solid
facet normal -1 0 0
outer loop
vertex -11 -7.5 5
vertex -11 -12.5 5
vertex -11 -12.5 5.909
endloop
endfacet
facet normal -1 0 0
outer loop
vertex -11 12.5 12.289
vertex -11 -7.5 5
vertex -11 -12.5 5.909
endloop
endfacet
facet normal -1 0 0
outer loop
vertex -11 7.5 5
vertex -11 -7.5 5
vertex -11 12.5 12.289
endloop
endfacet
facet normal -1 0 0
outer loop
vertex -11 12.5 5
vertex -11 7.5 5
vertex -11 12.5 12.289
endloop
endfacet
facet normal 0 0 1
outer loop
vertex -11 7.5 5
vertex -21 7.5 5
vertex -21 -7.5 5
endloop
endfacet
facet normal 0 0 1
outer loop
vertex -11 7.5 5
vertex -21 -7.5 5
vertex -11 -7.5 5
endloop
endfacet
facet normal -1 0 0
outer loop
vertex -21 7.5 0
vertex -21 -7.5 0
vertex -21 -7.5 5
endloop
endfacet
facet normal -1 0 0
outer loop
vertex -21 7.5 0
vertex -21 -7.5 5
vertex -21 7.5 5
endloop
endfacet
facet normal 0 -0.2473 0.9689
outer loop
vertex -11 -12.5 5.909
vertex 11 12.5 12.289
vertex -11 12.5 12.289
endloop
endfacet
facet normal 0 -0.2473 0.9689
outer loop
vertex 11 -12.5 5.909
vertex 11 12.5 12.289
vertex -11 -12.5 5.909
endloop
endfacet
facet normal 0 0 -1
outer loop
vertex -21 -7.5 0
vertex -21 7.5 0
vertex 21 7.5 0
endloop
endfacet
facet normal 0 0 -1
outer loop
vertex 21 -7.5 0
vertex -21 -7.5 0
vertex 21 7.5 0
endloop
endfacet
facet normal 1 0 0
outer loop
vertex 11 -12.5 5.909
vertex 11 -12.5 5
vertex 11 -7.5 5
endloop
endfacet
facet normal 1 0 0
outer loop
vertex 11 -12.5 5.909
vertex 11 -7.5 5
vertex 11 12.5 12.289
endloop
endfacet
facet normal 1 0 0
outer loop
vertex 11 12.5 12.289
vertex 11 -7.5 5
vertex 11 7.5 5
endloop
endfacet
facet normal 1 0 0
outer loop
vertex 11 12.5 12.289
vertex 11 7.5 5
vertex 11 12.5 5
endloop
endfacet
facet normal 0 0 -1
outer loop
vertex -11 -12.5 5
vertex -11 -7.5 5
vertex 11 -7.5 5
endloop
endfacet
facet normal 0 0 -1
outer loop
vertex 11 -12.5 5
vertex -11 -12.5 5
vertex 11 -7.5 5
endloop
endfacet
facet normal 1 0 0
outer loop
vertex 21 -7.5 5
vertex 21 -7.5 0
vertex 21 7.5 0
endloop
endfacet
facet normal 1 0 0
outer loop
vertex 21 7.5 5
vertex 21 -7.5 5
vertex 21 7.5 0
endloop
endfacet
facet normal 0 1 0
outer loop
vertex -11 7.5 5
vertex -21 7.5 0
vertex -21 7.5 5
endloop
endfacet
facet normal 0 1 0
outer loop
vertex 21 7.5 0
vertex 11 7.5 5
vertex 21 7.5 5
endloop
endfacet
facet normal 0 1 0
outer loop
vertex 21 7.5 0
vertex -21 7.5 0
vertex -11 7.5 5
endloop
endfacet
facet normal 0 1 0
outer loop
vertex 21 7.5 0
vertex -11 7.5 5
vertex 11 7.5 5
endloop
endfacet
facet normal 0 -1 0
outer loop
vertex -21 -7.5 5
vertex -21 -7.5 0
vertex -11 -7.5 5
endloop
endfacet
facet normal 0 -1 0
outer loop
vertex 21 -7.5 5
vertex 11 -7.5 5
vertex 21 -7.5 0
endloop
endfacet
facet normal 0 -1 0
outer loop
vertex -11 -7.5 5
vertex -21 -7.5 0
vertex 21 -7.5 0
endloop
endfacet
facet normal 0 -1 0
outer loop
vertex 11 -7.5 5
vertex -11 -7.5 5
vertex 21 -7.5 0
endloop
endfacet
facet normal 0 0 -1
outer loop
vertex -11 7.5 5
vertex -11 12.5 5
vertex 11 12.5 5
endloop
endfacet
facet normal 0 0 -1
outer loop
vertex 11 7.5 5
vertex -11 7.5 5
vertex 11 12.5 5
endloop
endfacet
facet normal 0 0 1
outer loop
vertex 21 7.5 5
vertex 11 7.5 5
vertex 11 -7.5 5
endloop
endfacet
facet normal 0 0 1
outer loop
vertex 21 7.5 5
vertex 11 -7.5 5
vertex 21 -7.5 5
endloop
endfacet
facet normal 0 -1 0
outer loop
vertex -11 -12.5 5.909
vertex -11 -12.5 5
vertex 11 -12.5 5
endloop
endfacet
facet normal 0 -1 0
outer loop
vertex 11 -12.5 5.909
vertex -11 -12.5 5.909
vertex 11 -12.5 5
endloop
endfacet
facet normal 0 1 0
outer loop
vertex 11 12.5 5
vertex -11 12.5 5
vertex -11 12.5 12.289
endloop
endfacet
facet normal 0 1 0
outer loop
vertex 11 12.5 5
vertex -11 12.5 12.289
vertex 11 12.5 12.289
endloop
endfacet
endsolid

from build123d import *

# Parameters (mm, degrees)
SKETCH_1_W          = 42
SKETCH_1_H          = 15
EXTRUDE_1_DEPTH     = 5
SKETCH_2_W          = 22
SKETCH_2_H          = 25
EXTRUDE_2_DEPTH     = 9.5
CUT_EXTRUDE_1_DEPTH = 37


with BuildPart() as part:
    # 스케치1 → 보스-돌출1 (new body)
    with BuildSketch(Plane.XY):
        Rectangle(SKETCH_1_W, SKETCH_1_H)
    extrude(amount=EXTRUDE_1_DEPTH)

    # 스케치2 → 보스-돌출2 (add)
    with BuildSketch(Plane.XY.offset(5)):
        Rectangle(SKETCH_2_W, SKETCH_2_H)
    extrude(amount=EXTRUDE_2_DEPTH)

    # 스케치3 → 컷-돌출1 (cut)
    with BuildSketch(Plane(origin=(11, 0, 0), x_dir=(0, 0, -1), z_dir=(1, 0, 0))):
        Polygon((-12.28944968, 12.5), (-5.909253868, -12.5), (-14.5, -12.5), (-14.5, 12.5), align=None)
    extrude(amount=-CUT_EXTRUDE_1_DEPTH, mode=Mode.SUBTRACT)


solid = part.part
